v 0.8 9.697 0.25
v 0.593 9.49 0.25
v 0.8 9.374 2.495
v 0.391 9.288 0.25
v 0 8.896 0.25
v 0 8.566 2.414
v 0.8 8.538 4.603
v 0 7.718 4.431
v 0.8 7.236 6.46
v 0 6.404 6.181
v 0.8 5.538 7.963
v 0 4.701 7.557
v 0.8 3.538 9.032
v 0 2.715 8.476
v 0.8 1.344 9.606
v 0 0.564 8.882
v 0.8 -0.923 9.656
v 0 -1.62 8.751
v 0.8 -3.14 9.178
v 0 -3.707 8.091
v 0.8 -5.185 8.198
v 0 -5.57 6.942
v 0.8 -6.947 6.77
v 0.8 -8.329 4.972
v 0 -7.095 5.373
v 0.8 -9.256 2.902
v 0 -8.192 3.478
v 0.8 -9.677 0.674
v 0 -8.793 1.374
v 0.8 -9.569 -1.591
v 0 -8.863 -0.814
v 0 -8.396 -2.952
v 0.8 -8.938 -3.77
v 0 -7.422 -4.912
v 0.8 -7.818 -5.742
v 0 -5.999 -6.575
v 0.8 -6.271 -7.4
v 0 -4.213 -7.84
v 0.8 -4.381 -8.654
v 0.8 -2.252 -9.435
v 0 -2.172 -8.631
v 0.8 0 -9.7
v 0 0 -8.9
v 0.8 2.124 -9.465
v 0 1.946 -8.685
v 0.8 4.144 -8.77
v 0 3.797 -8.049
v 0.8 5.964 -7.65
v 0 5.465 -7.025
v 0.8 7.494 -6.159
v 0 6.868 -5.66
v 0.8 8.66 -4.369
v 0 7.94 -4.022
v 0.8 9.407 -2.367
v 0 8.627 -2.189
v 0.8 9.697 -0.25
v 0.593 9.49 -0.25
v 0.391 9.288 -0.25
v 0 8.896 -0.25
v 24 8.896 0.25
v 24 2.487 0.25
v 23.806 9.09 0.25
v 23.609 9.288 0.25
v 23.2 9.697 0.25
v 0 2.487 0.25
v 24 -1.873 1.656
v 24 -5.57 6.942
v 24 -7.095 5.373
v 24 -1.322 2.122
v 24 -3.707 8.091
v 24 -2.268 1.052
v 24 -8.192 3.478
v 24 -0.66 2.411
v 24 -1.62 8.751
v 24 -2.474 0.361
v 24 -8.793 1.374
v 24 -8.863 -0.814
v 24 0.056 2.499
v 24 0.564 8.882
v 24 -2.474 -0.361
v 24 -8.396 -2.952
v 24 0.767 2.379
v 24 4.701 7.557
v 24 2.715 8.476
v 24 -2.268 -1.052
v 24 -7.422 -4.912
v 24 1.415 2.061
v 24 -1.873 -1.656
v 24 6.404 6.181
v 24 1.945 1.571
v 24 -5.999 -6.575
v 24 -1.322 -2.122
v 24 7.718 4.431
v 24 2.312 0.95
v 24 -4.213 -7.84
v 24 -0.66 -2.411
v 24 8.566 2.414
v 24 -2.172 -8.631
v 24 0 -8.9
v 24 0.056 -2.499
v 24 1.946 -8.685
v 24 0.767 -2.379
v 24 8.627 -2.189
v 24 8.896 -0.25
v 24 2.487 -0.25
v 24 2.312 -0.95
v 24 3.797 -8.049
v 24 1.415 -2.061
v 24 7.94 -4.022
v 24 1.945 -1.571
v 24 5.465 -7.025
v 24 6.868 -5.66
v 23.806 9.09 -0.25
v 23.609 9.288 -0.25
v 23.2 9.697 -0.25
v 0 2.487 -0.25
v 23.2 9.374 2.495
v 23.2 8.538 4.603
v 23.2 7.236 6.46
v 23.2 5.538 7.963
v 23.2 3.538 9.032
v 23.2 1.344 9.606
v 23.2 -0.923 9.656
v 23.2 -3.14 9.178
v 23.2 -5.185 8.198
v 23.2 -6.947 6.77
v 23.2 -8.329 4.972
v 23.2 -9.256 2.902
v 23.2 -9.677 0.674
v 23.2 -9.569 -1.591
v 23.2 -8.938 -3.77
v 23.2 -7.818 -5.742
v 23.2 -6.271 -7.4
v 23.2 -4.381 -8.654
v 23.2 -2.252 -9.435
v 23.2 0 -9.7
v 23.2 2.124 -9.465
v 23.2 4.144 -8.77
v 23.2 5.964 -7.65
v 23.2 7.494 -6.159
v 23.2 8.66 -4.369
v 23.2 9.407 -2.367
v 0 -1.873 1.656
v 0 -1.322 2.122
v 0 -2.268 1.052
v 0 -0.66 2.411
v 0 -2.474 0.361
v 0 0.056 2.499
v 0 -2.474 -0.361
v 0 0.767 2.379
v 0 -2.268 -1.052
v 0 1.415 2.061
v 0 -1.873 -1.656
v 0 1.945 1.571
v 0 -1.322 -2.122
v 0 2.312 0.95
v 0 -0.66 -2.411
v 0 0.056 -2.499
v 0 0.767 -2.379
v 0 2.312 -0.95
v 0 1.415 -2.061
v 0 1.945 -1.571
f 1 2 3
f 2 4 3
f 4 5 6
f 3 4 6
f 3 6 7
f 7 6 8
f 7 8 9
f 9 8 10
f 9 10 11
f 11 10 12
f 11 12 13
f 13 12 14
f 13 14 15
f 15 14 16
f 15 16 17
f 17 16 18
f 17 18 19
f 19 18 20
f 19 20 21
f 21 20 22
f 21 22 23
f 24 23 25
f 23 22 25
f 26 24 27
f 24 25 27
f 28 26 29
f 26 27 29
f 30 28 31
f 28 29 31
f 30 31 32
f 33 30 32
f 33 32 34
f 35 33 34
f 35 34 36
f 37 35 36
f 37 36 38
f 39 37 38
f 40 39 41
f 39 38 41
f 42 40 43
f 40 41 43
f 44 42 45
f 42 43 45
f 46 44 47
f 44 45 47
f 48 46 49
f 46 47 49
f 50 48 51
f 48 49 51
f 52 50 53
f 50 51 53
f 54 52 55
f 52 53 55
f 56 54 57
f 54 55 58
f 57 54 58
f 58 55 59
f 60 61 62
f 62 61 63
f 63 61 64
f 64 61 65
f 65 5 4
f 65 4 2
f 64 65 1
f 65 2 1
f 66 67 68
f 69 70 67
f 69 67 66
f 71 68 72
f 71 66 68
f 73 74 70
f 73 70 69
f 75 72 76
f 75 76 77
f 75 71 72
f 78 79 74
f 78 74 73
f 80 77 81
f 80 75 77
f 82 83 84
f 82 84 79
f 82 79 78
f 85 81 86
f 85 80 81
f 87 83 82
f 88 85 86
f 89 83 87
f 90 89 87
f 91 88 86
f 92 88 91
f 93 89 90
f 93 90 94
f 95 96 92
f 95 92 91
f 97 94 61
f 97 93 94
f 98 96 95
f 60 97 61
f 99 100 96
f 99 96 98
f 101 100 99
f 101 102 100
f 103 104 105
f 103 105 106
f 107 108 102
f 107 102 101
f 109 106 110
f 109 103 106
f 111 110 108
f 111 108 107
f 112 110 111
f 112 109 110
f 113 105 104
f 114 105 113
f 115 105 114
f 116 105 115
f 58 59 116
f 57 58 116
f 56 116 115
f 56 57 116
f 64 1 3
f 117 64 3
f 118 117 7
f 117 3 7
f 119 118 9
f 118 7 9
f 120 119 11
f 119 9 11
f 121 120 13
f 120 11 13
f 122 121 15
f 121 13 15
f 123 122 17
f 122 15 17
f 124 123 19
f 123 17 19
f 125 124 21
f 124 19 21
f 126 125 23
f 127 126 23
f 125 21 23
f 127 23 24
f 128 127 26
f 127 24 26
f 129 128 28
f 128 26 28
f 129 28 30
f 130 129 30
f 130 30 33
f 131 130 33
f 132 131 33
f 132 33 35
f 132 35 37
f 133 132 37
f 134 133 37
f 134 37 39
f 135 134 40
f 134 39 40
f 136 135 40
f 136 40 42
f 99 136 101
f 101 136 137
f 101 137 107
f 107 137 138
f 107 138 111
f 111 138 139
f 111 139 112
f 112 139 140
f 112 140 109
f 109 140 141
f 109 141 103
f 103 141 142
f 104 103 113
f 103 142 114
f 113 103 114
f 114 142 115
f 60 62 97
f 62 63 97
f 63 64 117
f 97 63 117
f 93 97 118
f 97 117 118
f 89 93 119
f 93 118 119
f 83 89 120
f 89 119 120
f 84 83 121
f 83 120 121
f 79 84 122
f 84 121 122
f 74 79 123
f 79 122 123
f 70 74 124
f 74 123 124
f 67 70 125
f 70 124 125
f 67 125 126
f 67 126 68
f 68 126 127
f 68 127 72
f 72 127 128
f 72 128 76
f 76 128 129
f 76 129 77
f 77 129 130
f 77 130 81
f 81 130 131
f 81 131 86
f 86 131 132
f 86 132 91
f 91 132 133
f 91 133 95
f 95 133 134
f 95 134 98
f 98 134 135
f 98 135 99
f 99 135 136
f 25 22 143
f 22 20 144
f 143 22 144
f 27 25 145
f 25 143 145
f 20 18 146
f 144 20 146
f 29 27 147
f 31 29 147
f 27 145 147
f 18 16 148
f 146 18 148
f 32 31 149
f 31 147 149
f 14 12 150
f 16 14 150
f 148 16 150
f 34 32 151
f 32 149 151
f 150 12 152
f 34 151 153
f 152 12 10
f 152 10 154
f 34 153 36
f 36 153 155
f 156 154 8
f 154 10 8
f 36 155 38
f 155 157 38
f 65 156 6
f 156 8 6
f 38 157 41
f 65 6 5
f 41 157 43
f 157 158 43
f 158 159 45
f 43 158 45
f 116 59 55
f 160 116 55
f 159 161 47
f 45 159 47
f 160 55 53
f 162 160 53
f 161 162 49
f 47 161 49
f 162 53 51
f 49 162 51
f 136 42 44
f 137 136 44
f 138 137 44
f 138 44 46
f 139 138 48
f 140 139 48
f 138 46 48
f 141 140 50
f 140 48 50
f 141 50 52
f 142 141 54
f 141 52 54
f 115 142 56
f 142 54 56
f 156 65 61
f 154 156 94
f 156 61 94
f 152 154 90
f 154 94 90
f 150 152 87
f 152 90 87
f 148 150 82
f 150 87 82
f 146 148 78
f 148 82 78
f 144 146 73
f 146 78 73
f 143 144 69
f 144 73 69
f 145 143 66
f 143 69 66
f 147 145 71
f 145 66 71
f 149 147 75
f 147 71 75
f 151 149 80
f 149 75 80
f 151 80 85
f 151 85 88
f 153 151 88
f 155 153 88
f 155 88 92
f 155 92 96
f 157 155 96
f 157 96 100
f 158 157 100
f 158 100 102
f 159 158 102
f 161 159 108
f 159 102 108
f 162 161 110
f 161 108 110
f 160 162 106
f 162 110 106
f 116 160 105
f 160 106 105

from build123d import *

# Parameters (mm, degrees)
SKETCH1_R           = 9.7
BOSS_EXTRUDE1_DEPTH = 24
SKETCH2_R           = 2.5
CUT_EXTRUDE1_DEPTH  = 28.643805816
SKETCH3_W           = 0.5
SKETCH3_H           = 19.4
CUT_EXTRUDE2_DEPTH  = 28.643805816
CHAMFER1_SIZE       = 0.8


with BuildPart() as part:
    # Sketch1 → Boss-Extrude1 (new body)
    with BuildSketch(Plane(origin=(0, 0, 0), x_dir=(0, 0, -1), z_dir=(1, 0, 0))):
        Circle(SKETCH1_R)
    extrude(amount=BOSS_EXTRUDE1_DEPTH)

    # Sketch2 → Cut-Extrude1 (cut, through all)
    with BuildSketch(Plane(origin=(24, 0, 0), x_dir=(0, 0, -1), z_dir=(1, 0, 0))):
        Circle(SKETCH2_R)
    extrude(amount=-CUT_EXTRUDE1_DEPTH, mode=Mode.SUBTRACT)

    # Sketch3 → Cut-Extrude2 (cut, through all)
    with BuildSketch(Plane.ZY):
        with Locations((0, 9.7)):
            Rectangle(SKETCH3_W, SKETCH3_H)
    extrude(amount=-CUT_EXTRUDE2_DEPTH, mode=Mode.SUBTRACT)

    # Chamfer1
    chamfer1_edges = [part.edges().sort_by_distance(p)[0] for p in [
        (0, -6.946761836, 6.769970458),
        (24, -6.946761836, 6.769970458),
    ]]
    chamfer(chamfer1_edges, length=CHAMFER1_SIZE)


solid = part.part
